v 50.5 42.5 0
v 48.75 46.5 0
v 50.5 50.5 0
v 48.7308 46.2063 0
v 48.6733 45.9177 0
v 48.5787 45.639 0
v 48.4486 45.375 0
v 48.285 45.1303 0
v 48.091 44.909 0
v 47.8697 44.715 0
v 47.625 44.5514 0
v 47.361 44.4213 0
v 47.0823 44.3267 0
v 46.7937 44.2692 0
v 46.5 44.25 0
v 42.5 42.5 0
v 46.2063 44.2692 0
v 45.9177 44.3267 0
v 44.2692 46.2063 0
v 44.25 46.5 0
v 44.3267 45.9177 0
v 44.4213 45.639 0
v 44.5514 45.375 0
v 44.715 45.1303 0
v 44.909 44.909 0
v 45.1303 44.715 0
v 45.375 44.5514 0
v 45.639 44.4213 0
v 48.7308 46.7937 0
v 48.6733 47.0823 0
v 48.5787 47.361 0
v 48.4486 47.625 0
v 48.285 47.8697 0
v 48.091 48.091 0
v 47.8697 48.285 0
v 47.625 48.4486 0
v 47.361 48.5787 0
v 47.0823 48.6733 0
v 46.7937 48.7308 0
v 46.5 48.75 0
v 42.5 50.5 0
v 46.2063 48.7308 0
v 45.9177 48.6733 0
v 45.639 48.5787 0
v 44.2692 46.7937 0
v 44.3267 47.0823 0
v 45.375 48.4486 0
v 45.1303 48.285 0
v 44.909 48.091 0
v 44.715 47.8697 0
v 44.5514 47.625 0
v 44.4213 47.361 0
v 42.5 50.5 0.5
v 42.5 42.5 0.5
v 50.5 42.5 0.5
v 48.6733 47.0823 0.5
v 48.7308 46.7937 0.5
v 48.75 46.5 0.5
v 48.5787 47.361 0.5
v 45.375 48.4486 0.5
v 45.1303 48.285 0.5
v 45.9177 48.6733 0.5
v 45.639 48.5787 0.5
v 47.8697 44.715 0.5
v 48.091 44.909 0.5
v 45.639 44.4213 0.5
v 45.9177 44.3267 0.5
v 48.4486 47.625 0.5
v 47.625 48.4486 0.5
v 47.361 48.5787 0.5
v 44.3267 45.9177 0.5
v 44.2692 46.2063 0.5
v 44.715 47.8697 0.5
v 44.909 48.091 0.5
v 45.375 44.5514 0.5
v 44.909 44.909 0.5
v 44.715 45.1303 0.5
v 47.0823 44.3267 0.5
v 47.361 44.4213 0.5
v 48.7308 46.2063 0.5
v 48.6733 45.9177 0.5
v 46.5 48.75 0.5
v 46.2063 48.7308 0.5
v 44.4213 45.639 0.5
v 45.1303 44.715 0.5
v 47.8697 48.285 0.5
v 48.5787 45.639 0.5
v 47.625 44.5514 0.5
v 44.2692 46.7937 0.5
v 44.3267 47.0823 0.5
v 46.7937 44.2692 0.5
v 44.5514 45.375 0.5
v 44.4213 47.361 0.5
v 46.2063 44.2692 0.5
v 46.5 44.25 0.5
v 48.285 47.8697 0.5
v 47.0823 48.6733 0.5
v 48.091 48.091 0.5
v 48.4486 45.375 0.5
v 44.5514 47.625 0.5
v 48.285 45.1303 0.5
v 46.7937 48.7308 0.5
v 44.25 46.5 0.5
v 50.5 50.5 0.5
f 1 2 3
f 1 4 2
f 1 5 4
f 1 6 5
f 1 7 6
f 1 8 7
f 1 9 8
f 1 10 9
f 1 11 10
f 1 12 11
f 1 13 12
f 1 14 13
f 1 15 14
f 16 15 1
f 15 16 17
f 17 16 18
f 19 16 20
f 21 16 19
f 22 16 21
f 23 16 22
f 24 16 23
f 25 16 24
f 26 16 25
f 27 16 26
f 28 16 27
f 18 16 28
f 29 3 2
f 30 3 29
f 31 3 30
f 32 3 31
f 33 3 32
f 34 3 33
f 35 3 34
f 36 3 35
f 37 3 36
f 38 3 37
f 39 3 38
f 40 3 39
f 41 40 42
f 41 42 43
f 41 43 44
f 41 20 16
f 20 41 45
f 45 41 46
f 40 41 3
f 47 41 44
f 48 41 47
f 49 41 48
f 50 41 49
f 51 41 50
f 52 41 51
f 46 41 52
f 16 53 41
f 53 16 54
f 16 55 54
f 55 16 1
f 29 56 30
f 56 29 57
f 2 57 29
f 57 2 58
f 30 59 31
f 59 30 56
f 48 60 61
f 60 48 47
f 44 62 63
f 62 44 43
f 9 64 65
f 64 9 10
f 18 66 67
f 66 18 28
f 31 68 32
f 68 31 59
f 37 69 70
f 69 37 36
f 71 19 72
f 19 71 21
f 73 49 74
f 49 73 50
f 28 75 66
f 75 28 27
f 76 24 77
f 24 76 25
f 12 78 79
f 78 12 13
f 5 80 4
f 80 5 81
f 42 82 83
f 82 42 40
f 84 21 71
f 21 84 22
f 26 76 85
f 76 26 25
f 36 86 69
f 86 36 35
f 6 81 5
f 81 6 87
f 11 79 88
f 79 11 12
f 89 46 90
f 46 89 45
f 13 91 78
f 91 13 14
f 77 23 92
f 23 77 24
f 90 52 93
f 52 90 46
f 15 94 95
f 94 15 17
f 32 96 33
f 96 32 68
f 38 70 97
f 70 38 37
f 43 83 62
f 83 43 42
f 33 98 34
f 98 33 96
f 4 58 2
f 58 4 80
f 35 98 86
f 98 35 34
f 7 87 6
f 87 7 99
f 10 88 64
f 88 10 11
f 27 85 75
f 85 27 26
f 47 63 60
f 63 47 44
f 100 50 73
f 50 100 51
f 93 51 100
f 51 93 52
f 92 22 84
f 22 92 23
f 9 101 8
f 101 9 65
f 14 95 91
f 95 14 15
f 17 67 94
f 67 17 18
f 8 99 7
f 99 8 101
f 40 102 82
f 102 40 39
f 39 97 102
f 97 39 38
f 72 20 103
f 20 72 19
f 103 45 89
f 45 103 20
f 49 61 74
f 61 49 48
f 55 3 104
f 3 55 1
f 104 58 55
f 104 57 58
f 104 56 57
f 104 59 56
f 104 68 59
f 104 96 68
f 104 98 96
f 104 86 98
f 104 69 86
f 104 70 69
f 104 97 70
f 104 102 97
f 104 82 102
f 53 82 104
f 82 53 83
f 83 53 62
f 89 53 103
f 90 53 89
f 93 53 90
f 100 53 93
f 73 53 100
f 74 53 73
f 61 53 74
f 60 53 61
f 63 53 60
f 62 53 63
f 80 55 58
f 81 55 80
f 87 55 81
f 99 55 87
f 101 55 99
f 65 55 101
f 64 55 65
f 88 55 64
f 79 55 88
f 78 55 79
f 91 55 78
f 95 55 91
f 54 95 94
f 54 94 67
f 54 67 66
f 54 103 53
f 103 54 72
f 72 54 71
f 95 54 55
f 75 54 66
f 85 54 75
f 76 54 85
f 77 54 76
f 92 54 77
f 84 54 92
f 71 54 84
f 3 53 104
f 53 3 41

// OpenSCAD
// Roof ∩ one standoff's footprint, 0.5 mm above the roof's underside.
// Non-empty ⇒ the roof bears on that standoff.
include <../../src/lantern.scad>
part = "none";
corner = 0;
s = slot_end + 0.5;
intersection() {
  roof();
  rotate(corner * 90) translate([s, s, -1]) cube([half - 0.5 - s, half - 0.5 - s, 1.5]);
}
